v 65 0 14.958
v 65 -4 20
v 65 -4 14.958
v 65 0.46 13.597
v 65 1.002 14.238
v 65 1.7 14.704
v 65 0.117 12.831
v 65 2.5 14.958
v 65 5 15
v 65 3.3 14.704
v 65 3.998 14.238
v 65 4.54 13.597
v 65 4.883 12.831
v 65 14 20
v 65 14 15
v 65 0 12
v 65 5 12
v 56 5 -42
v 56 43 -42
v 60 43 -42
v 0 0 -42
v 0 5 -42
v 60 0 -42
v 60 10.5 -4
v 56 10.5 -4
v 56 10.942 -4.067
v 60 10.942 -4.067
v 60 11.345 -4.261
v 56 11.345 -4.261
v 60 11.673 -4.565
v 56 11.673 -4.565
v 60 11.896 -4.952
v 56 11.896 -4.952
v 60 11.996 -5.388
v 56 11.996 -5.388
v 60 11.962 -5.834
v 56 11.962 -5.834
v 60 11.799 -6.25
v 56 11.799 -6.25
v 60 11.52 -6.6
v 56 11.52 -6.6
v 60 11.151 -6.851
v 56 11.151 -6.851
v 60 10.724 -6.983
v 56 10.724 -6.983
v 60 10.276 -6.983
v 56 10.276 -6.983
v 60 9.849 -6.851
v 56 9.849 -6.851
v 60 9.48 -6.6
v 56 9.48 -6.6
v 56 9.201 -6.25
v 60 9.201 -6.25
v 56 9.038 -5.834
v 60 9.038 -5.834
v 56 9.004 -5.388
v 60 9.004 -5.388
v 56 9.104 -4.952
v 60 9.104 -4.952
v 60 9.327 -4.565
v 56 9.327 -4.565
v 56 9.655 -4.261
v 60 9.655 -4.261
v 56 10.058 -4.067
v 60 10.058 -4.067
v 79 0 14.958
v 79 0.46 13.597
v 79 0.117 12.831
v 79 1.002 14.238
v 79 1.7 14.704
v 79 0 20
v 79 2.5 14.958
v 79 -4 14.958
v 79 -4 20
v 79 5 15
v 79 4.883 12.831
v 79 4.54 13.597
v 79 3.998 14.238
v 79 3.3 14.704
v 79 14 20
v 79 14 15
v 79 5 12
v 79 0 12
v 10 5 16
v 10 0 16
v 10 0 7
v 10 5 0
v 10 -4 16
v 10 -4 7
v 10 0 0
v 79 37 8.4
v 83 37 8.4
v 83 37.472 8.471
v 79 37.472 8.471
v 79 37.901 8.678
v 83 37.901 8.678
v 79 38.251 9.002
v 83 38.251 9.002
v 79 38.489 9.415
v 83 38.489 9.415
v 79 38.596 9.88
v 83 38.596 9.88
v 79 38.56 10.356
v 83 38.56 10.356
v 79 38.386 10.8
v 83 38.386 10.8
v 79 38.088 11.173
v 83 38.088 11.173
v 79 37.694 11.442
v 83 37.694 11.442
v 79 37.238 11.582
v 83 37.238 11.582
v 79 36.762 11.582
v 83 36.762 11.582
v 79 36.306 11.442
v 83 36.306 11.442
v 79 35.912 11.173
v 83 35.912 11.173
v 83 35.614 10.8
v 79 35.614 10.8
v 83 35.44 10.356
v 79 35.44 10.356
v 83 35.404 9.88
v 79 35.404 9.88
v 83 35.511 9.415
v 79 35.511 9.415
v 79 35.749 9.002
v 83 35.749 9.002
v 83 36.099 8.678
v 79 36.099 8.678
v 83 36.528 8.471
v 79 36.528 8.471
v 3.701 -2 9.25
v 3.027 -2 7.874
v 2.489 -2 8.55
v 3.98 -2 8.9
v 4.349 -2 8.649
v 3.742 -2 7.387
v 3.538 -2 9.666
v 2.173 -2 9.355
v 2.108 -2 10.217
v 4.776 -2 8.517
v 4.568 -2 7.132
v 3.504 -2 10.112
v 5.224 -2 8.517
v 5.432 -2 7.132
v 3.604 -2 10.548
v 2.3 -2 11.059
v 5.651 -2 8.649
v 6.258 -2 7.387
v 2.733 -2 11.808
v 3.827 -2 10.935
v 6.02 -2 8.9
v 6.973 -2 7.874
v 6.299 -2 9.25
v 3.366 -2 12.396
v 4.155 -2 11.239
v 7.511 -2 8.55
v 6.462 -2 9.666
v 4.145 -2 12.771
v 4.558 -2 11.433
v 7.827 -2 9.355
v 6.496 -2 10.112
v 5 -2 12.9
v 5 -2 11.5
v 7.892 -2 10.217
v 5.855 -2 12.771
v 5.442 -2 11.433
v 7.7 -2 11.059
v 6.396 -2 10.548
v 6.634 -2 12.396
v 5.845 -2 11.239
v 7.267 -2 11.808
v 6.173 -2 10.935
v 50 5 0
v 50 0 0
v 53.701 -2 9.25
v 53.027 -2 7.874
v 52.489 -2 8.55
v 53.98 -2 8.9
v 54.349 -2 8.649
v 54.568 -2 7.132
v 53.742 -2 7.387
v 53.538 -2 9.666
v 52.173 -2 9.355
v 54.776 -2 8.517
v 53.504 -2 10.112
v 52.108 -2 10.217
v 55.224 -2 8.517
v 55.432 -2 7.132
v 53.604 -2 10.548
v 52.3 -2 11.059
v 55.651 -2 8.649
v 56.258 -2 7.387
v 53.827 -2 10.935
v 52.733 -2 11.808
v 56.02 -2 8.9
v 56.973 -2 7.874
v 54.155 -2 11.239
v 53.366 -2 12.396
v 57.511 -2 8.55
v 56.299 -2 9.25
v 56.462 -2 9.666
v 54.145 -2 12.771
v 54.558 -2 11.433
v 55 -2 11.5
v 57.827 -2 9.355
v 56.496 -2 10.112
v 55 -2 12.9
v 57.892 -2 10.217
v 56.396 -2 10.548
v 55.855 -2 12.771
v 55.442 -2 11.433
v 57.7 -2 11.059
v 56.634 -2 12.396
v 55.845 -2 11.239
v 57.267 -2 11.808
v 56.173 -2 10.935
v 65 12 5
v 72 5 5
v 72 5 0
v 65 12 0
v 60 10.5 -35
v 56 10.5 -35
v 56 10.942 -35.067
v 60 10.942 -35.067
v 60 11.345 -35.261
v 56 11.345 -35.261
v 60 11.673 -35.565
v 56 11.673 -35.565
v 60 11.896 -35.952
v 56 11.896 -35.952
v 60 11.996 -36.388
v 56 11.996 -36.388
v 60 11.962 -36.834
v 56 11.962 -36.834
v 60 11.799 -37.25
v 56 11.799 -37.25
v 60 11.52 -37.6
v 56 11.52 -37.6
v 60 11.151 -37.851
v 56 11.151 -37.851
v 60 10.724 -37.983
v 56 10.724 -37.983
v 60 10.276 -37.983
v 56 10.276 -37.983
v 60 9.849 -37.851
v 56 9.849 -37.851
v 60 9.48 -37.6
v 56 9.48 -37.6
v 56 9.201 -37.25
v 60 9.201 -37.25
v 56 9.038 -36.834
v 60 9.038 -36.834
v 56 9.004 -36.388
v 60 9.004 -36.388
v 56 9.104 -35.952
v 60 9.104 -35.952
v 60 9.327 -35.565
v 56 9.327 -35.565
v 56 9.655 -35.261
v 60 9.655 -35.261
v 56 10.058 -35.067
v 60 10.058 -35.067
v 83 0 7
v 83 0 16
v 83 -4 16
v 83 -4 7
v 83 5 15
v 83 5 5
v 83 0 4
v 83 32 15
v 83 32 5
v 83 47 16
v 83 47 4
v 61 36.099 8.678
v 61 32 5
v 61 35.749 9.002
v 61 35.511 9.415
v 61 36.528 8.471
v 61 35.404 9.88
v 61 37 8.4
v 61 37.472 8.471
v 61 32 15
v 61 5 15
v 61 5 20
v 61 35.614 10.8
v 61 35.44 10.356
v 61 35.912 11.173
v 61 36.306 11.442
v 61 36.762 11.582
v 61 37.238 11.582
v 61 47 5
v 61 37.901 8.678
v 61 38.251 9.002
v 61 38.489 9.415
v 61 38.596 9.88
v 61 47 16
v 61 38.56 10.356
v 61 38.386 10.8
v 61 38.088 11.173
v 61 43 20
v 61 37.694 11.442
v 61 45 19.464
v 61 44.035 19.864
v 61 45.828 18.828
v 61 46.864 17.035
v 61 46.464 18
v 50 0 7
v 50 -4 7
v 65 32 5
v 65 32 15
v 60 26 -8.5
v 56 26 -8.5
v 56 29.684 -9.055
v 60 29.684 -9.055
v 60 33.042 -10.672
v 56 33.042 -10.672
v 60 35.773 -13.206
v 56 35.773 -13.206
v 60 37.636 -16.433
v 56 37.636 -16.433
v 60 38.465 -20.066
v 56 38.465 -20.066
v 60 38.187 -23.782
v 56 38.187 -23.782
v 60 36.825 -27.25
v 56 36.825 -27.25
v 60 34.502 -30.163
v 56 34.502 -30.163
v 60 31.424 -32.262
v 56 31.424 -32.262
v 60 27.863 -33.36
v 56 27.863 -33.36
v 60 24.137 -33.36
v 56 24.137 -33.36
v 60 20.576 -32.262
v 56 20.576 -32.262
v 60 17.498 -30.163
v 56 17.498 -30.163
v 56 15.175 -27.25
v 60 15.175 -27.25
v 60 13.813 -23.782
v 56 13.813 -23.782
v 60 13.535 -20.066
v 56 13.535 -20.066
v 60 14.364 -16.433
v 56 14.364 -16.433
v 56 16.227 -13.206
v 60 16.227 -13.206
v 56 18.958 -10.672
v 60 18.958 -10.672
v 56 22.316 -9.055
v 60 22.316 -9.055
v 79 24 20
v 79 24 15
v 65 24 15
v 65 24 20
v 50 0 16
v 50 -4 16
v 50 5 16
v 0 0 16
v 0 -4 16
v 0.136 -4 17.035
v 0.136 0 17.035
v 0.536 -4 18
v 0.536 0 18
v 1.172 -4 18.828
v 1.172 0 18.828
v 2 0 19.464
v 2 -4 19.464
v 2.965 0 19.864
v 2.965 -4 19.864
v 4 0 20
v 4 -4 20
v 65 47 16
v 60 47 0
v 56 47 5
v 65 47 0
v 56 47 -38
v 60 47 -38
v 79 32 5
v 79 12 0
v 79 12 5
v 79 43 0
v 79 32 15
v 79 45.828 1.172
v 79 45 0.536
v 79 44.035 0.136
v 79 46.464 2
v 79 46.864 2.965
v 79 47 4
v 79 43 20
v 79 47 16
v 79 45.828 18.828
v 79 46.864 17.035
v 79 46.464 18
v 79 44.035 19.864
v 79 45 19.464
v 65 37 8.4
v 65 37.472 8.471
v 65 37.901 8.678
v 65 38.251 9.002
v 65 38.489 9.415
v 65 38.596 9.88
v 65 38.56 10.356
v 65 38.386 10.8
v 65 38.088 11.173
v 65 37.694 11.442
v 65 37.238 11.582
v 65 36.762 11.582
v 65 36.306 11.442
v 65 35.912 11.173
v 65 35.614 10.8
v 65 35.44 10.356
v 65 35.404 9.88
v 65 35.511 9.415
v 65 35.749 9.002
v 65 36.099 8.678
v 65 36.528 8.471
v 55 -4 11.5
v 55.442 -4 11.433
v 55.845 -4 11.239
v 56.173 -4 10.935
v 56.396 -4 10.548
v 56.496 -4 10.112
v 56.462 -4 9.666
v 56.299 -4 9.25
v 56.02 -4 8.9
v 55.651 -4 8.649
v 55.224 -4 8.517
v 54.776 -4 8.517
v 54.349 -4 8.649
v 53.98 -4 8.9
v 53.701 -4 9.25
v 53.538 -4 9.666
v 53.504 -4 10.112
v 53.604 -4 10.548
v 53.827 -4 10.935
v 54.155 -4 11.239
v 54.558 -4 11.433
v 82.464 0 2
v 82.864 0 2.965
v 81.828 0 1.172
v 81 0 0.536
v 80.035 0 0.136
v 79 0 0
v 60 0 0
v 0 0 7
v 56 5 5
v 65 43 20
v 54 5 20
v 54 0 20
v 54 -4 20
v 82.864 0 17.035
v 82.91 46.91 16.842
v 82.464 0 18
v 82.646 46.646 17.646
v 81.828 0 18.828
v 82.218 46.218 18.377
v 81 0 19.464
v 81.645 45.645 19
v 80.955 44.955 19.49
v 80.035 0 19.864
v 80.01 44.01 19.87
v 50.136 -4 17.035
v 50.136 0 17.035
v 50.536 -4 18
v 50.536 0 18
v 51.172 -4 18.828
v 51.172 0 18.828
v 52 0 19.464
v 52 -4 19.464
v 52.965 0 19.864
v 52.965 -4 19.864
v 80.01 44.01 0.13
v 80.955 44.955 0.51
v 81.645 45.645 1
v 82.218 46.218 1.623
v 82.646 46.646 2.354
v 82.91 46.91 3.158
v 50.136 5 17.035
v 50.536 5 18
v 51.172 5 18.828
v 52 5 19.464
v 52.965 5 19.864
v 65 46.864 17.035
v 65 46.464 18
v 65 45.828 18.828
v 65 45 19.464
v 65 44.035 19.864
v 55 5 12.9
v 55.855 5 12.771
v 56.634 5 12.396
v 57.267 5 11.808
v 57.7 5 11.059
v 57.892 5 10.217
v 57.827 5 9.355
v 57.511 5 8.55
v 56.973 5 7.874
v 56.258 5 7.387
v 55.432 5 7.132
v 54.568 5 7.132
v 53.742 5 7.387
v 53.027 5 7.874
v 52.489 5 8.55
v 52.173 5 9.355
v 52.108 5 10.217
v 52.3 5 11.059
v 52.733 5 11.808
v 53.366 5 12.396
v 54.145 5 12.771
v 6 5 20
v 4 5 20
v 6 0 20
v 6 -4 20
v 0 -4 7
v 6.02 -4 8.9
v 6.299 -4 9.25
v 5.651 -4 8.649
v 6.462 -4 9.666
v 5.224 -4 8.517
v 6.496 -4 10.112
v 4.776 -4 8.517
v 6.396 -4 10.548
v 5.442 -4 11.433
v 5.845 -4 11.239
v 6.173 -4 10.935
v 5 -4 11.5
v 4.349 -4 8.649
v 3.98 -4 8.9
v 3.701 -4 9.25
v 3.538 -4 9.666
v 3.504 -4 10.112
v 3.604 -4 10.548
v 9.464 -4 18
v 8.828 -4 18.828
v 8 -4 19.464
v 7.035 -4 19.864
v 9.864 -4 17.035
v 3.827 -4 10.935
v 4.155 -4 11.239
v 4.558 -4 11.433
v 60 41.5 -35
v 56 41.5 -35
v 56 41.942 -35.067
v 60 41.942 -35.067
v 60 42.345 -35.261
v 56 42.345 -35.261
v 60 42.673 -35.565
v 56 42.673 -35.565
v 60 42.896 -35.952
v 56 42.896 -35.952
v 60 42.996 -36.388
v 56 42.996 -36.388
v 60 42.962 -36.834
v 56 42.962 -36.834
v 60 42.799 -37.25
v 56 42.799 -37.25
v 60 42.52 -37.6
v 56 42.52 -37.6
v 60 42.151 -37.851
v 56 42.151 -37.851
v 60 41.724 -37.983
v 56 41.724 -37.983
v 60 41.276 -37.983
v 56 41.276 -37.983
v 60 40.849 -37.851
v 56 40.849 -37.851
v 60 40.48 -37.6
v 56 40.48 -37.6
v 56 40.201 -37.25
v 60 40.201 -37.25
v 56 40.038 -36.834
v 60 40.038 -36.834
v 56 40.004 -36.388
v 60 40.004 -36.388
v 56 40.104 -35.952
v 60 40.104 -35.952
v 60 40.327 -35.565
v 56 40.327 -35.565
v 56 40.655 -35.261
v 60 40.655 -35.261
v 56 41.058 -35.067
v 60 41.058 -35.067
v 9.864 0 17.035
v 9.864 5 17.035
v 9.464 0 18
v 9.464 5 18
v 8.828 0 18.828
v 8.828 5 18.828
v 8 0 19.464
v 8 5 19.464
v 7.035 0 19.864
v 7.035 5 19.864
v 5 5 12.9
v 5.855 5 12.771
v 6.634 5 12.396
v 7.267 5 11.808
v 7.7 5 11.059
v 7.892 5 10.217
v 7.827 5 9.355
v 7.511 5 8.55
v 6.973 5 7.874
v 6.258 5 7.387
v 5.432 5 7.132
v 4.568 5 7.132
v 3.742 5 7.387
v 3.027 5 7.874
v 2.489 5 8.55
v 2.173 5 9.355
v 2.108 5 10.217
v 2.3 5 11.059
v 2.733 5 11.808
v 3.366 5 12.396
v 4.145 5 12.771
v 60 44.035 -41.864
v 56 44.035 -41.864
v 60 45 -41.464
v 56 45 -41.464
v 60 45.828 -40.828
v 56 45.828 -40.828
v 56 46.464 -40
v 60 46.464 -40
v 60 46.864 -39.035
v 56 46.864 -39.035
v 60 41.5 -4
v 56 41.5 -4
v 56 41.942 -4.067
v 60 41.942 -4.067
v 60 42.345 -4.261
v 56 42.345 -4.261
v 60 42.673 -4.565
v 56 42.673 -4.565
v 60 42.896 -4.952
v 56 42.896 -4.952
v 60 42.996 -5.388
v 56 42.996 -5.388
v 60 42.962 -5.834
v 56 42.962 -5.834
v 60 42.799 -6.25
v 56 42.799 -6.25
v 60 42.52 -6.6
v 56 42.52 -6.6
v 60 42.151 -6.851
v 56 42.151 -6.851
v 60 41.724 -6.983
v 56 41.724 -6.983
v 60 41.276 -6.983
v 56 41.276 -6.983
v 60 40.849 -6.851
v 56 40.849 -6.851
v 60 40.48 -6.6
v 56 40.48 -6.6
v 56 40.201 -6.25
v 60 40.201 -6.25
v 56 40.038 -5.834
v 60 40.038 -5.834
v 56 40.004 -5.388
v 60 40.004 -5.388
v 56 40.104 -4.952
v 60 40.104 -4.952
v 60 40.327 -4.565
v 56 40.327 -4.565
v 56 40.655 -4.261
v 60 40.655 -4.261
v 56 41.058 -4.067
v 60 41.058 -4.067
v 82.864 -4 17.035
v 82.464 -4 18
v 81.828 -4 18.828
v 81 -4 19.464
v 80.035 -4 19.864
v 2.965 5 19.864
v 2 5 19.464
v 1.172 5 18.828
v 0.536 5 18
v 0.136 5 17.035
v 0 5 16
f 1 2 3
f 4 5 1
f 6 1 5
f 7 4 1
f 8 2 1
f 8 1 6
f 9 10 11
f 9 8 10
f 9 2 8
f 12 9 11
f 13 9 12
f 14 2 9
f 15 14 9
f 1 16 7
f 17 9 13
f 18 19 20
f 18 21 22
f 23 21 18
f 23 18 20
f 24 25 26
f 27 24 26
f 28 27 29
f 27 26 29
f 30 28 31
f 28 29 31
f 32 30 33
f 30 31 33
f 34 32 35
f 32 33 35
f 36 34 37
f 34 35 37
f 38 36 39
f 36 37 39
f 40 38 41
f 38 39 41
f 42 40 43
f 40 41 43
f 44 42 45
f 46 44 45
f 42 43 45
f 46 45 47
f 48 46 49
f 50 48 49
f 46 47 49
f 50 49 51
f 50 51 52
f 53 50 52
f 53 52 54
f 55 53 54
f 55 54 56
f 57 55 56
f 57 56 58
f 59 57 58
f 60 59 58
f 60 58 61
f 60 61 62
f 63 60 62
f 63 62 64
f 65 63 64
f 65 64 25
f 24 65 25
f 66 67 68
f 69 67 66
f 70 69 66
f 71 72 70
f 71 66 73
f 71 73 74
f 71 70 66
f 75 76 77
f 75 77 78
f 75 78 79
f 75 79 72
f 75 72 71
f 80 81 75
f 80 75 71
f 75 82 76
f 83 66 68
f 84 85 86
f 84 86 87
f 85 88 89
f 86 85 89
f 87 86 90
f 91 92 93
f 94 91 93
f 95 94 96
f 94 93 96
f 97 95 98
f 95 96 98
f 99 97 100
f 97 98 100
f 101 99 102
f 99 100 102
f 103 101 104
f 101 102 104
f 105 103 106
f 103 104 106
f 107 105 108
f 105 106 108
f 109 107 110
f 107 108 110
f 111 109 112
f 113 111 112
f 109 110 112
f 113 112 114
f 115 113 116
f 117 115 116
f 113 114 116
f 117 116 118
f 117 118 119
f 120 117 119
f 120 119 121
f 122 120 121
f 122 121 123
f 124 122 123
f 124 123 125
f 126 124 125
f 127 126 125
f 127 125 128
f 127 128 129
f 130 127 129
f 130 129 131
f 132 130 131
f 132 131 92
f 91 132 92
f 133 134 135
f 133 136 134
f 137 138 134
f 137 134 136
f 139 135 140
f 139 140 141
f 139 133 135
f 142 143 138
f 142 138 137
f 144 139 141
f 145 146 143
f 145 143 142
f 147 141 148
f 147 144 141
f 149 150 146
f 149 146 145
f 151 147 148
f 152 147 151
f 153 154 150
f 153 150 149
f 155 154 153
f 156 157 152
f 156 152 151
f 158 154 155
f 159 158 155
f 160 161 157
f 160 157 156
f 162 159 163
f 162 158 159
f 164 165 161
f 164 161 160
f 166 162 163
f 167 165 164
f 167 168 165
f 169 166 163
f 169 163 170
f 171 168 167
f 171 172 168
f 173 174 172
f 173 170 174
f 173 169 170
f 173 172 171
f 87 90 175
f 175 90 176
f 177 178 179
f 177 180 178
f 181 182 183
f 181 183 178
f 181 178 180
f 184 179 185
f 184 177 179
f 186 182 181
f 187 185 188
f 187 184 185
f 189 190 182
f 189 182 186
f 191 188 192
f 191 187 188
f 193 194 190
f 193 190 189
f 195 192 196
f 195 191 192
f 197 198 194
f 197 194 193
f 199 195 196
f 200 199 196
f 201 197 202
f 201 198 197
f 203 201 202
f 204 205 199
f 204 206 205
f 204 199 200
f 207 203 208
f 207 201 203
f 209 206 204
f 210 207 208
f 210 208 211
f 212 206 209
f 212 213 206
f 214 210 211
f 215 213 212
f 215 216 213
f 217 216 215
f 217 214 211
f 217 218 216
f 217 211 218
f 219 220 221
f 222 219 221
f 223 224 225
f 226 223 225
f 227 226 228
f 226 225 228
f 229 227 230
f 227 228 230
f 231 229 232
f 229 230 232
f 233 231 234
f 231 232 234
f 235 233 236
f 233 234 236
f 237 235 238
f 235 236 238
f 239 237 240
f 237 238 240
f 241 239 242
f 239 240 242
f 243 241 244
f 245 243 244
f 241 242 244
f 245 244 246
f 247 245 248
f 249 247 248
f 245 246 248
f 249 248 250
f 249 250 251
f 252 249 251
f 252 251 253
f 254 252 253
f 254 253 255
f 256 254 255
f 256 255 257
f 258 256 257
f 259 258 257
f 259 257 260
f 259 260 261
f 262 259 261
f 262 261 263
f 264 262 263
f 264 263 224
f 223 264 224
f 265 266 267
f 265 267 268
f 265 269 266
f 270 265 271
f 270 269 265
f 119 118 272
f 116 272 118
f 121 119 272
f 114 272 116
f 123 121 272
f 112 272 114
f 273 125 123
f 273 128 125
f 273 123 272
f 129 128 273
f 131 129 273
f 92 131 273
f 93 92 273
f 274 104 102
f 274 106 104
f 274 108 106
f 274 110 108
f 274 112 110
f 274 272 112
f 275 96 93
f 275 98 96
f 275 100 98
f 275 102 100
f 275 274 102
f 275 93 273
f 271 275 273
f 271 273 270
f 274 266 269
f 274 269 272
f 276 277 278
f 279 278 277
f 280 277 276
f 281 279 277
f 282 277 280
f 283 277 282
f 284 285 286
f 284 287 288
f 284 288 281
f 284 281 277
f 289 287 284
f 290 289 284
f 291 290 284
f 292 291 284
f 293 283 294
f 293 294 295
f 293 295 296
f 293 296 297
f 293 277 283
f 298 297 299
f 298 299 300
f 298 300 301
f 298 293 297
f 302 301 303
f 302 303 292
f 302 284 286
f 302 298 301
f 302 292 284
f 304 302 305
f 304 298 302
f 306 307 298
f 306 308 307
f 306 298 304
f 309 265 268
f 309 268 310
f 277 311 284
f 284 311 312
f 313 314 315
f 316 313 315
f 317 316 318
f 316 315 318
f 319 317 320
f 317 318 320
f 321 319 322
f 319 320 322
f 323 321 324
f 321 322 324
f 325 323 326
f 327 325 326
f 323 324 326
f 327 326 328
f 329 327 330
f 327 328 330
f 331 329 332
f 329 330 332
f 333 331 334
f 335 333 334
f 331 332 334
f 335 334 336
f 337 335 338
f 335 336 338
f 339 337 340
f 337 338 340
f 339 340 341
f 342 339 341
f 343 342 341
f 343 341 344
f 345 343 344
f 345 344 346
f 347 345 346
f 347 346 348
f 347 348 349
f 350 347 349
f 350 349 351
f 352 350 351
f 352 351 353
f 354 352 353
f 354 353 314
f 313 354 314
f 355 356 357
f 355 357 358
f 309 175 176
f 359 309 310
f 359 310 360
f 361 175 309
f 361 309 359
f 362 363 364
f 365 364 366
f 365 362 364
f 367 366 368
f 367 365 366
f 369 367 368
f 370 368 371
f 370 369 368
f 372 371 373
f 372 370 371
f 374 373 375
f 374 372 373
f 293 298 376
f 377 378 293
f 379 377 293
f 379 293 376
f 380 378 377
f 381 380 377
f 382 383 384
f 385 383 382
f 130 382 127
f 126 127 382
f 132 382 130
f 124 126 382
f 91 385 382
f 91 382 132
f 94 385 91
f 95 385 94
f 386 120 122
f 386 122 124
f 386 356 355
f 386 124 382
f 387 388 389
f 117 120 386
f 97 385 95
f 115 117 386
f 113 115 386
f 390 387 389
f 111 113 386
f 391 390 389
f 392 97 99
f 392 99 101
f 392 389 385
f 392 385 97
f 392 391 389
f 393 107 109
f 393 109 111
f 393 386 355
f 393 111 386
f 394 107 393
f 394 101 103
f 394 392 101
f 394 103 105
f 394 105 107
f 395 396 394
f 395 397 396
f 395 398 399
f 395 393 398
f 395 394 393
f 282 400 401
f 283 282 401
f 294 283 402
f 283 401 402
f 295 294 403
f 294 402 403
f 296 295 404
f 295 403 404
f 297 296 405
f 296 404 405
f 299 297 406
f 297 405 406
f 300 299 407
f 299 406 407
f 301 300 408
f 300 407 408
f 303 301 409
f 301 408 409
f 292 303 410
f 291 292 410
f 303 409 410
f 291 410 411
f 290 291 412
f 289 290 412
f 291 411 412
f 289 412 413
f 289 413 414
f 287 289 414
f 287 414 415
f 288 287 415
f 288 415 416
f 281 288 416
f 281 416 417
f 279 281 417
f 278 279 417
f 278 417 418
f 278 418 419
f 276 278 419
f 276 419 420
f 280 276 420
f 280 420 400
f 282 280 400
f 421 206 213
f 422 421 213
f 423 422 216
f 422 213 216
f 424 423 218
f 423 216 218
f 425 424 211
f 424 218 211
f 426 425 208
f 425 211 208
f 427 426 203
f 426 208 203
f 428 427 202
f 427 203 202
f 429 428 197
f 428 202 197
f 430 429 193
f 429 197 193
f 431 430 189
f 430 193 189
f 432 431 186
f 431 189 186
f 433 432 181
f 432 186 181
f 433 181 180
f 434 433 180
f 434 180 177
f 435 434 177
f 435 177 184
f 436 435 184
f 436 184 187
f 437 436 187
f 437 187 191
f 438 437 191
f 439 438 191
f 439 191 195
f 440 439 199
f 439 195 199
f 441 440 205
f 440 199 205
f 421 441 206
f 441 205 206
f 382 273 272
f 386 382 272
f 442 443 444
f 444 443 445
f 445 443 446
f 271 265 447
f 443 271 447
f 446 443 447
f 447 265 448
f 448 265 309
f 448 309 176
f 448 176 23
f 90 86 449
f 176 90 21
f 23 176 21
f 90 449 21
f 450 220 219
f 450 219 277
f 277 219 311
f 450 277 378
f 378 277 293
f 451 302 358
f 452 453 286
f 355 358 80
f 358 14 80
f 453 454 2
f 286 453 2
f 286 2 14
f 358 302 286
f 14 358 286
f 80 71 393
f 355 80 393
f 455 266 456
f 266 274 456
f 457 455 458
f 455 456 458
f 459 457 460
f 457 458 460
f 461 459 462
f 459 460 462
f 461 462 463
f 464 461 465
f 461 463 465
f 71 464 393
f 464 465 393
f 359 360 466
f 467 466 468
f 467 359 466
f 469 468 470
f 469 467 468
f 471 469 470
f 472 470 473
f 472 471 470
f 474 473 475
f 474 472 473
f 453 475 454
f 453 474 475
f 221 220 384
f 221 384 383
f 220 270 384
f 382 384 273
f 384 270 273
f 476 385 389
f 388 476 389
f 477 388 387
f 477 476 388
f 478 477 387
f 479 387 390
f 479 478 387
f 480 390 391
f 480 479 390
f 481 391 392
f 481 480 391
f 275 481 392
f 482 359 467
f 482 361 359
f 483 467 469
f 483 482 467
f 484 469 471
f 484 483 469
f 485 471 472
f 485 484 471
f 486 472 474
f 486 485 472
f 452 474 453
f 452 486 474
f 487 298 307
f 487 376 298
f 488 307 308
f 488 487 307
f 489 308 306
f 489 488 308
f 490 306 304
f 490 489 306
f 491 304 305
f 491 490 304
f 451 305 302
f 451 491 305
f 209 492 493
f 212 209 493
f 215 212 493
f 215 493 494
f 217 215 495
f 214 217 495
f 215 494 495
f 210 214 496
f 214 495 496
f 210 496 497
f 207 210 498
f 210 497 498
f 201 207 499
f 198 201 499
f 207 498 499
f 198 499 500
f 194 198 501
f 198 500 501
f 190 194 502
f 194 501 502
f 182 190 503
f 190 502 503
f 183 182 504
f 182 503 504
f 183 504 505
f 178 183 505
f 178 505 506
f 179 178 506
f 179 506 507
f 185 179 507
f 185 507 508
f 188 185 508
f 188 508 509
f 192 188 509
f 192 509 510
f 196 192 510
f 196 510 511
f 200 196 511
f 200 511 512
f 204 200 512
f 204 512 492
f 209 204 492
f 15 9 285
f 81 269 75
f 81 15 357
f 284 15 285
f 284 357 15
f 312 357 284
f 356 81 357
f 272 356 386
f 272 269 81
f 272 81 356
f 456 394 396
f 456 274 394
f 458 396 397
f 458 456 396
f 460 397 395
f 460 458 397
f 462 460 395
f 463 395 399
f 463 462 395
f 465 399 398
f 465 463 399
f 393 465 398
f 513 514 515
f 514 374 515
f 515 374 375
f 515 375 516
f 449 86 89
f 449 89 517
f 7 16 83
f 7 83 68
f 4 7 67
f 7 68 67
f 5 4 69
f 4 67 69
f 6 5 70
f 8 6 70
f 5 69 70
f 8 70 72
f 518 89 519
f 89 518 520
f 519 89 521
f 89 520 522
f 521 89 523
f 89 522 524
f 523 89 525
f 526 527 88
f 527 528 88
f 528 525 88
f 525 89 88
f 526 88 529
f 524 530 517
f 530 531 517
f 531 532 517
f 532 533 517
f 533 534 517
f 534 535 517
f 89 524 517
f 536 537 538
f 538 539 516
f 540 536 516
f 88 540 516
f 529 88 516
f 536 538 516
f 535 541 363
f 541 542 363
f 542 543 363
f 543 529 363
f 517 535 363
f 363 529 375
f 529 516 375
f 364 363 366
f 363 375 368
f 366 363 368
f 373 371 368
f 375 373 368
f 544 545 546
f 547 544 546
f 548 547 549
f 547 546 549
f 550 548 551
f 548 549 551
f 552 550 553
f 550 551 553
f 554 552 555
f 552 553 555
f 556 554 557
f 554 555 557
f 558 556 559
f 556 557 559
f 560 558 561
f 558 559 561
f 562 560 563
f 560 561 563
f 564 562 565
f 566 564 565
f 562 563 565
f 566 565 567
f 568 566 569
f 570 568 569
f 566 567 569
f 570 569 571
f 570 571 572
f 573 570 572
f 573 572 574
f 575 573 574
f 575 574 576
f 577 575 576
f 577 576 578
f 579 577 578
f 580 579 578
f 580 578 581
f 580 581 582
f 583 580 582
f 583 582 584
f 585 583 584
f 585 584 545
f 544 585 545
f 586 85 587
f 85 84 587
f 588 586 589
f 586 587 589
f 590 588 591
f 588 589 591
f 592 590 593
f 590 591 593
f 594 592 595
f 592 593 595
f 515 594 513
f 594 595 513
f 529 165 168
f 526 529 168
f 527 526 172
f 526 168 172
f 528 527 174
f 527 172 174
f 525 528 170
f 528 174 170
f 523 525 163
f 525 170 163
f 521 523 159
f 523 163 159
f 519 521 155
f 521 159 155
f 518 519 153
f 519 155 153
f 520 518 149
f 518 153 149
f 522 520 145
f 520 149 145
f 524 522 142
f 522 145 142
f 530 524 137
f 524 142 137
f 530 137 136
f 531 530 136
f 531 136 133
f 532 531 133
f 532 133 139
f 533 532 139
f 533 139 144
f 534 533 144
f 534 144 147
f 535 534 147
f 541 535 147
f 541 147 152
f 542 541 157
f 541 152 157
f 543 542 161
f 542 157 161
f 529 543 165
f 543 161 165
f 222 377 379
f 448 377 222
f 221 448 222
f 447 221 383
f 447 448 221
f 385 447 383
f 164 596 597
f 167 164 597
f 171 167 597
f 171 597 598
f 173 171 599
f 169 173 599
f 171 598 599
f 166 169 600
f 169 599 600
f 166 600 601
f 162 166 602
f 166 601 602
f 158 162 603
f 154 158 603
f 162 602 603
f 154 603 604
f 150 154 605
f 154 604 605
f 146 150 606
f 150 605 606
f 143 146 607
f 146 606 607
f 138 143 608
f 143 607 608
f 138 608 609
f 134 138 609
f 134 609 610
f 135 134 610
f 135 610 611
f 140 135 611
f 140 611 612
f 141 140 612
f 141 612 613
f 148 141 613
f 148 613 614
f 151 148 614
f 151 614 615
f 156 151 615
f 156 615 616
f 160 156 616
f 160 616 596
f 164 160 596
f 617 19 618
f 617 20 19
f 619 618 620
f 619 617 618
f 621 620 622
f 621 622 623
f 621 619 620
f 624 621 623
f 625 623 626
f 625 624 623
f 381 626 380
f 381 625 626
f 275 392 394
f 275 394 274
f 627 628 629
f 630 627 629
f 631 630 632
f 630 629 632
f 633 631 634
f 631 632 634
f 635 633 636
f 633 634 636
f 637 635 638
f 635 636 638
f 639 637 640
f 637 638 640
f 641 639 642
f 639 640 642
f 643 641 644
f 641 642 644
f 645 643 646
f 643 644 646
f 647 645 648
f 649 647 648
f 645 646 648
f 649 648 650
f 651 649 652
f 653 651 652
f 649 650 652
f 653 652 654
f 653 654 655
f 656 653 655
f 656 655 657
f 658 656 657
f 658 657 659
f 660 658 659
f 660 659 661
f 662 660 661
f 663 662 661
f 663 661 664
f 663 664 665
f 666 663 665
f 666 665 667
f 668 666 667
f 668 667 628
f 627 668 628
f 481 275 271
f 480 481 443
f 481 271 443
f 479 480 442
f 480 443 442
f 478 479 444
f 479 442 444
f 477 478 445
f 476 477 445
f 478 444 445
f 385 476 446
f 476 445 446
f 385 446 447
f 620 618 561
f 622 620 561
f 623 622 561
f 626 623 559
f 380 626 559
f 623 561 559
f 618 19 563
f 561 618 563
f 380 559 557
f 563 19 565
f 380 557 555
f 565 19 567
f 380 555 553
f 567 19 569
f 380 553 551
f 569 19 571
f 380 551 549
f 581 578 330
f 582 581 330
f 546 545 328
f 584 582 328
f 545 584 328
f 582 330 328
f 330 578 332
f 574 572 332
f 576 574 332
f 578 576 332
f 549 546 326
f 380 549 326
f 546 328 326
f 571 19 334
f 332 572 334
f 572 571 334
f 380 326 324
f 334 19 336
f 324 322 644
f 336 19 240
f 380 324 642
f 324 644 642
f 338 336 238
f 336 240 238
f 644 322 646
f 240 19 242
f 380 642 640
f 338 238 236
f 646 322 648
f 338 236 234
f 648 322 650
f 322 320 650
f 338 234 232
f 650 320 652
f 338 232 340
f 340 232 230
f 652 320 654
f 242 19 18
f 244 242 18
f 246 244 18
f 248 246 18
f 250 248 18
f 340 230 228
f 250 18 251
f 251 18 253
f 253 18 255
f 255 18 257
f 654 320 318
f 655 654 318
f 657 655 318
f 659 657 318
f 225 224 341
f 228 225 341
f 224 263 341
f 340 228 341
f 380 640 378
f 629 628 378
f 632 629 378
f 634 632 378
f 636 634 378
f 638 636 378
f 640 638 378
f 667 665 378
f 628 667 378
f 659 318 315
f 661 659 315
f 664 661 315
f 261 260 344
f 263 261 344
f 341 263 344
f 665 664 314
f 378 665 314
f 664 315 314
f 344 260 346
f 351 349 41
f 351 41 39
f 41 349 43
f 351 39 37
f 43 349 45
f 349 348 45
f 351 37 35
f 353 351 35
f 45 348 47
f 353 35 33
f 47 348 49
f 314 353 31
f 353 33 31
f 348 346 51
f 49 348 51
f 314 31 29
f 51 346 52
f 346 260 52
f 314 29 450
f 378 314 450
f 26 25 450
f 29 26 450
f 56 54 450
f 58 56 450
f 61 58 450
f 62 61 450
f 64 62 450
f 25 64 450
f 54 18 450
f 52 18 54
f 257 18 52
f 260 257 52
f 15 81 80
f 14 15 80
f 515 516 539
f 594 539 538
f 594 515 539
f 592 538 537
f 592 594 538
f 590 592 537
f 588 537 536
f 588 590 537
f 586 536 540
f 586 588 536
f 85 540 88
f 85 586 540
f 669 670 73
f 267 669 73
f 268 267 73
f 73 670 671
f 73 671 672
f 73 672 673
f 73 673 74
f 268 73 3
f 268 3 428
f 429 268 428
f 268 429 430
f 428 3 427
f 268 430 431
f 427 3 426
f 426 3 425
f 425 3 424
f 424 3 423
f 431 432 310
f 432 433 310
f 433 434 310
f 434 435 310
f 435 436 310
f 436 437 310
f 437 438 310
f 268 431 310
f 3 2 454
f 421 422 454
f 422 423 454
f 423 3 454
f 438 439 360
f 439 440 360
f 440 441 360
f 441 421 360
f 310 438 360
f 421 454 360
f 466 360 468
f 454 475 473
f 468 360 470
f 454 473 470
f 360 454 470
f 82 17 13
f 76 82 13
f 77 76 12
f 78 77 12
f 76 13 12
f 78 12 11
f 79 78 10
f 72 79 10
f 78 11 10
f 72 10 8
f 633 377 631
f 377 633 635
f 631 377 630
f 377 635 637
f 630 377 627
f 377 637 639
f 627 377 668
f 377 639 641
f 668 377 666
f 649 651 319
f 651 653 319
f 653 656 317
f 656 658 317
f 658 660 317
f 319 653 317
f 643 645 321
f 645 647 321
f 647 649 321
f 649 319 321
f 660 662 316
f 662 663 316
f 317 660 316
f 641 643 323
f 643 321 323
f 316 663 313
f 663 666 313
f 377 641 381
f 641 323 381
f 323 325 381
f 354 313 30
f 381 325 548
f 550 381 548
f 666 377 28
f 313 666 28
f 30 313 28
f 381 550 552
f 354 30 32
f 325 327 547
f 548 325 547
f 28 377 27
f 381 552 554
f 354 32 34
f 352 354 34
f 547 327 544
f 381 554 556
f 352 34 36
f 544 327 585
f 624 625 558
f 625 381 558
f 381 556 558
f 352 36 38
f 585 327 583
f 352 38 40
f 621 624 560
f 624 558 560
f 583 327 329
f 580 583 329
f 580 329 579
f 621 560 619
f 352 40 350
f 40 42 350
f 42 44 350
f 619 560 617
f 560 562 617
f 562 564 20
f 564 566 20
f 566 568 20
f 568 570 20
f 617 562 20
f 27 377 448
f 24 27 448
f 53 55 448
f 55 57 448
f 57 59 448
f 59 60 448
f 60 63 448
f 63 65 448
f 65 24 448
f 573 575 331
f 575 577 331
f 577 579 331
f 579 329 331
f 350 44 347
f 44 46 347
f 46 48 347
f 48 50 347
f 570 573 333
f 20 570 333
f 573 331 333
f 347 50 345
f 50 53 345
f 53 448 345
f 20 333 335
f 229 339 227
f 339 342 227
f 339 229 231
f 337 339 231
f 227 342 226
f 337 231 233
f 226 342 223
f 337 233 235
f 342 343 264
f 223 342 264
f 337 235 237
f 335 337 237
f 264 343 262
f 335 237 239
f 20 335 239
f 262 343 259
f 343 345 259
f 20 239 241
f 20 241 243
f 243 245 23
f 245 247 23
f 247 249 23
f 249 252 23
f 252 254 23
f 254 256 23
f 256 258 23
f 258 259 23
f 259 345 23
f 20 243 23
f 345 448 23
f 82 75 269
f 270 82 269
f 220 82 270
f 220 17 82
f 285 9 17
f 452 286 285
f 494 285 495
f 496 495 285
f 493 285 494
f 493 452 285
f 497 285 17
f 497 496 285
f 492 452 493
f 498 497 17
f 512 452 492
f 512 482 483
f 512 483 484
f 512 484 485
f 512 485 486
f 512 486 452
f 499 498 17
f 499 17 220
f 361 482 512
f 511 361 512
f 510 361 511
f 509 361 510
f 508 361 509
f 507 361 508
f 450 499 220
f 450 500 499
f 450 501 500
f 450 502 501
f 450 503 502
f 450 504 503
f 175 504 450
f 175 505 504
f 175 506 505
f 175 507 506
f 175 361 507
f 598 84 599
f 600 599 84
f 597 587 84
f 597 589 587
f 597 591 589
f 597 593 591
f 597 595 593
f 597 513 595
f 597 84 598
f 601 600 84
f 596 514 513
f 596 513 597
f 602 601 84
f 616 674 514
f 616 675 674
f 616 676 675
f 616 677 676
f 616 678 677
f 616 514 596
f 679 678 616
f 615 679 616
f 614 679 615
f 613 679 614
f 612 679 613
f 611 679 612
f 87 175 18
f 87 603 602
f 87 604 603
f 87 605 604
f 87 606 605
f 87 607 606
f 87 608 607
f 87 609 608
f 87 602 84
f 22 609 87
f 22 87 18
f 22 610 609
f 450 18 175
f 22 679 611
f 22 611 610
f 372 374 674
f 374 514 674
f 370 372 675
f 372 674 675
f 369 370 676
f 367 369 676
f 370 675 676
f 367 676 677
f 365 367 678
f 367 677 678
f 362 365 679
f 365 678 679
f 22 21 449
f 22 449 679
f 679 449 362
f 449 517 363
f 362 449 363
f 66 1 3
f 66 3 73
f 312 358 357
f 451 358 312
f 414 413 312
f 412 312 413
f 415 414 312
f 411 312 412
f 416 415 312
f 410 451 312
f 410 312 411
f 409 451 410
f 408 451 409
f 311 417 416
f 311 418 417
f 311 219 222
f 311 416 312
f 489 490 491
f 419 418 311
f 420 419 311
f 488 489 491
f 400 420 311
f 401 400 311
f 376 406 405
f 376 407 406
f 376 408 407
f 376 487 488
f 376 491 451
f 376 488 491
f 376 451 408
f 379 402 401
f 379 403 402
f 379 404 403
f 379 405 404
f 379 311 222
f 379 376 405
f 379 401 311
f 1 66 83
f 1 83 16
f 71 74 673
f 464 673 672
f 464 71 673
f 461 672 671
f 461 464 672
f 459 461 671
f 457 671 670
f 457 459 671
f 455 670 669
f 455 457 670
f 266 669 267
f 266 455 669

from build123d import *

# Parameters (mm, degrees)
EXTRUDE_1_DEPTH      = 5
SKETCH_3_W           = 4
SKETCH_3_H           = 42
EXTRUDE_2_DEPTH      = 42
SKETCH_4_R           = 1.5
CUT_EXTRUDE_1_DEPTH  = 42.5
SKETCH_5_R           = 12.5
CUT_EXTRUDE_2_DEPTH  = 42.5
SKETCH_6_R           = 1.5
CUT_EXTRUDE_3_DEPTH  = 42.5
SKETCH_7_W           = 20
SKETCH_7_H           = 5
EXTRUDE_3_DEPTH      = 5
EXTRUDE_5_DEPTH      = 42
SKETCH_11_W          = 20
SKETCH_11_H          = 5
EXTRUDE_6_DEPTH      = 18
SKETCH_12_W          = 4
SKETCH_12_H          = 20
EXTRUDE_7_DEPTH      = 42
CUT_EXTRUDE_4_REACH  = 106.221
SKETCH_13_R          = 1.6
CUT_EXTRUDE_START    = -22
SKETCH_15_W          = 10
SKETCH_15_H          = 27
CUT_EXTRUDE_5_DEPTH  = 22
SKETCH_16_W          = 5
SKETCH_16_H          = 5
CUT_EXTRUDE_6_DEPTH  = 42
EXTRUDE_START        = -22
SKETCH_17_W          = 10
SKETCH_17_H          = 5
EXTRUDE_8_DEPTH      = 22
CUT_EXTRUDE_7_DEPTH  = 5
FILLET_1_R           = 4
SKETCH_20_W          = 14
SKETCH_20_H          = 5
CUT_EXTRUDE_8_DEPTH  = 5
FILLET_3_R           = 3
SKETCH_21_R          = 2.9
CUT_EXTRUDE_9_DEPTH  = 3
EXTRUDE_9_DEPTH      = 4
SKETCH_24_R          = 1.5
CUT_EXTRUDE_10_DEPTH = 4
SKETCH_26_R          = 2.9
CUT_EXTRUDE_15_DEPTH = 4
CHAMFER_1_SIZE       = 7
EXTRUDE_10_REACH     = 103.064
SKETCH_28_W          = 5
SKETCH_28_H          = 10


# Some blends are built 0.0001 mm under size
with BuildPart() as part:
    # 草图1 → 凸台-拉伸1 (new body)
    with BuildSketch(Plane(origin=(0, 0, 0), x_dir=(1, 0, 0), z_dir=(0, 1, 0))):
        Polygon((10, 0), (50, 0), (50, -20), (60, -20), (60, 0), (60, 42), (0, 42), (0, 0), (0, -20), (10, -20), align=None)
    extrude(amount=EXTRUDE_1_DEPTH)

    # 草图3 → 凸台-拉伸2 (add)
    with BuildSketch(Plane(origin=(0, 5, 0), x_dir=(1, 0, 0), z_dir=(0, 1, 0))):
        with Locations((58, 21)):
            Rectangle(SKETCH_3_W, SKETCH_3_H)
    extrude(amount=EXTRUDE_2_DEPTH)

    # 草图4 → 切除-拉伸1 (cut)
    with BuildSketch(Plane.ZY.offset(-56)):
        with Locations((-36.5, 41.5)):
            Circle(SKETCH_4_R)
        with Locations((-5.5, 41.5)):
            Circle(SKETCH_4_R)
        with Locations((-5.5, 10.5)):
            Circle(SKETCH_4_R)
        with Locations((-36.5, 10.5)):
            Circle(SKETCH_4_R)
    extrude(amount=-CUT_EXTRUDE_1_DEPTH, mode=Mode.SUBTRACT)

    # 草图5 → 切除-拉伸2 (cut)
    with BuildSketch(Plane.ZY.offset(-56)):
        with Locations((-21, 26)):
            Circle(SKETCH_5_R)
    extrude(amount=-CUT_EXTRUDE_2_DEPTH, mode=Mode.SUBTRACT)

    # 草图6 → 切除-拉伸3 (cut)
    with BuildSketch(Plane(origin=(0, 5, 0), x_dir=(1, 0, 0), z_dir=(0, 1, 0))):
        with Locations(Location((55, -10, 0), (0, 0, 270))):
            Circle(SKETCH_6_R)
        with Locations(Location((5, -10, 0), (0, 0, 270))):
            Circle(SKETCH_6_R)
    extrude(amount=-CUT_EXTRUDE_3_DEPTH, mode=Mode.SUBTRACT)

    # 草图7 → 凸台-拉伸3 (add)
    with BuildSketch(Plane(origin=(60, 0, 0), x_dir=(0, 0, -1), z_dir=(1, 0, 0))):
        with Locations((-10, 2.5)):
            Rectangle(SKETCH_7_W, SKETCH_7_H)
    extrude(amount=EXTRUDE_3_DEPTH)

    # 草图8 → 凸台-拉伸5 (add)
    with BuildSketch(Plane(origin=(0, 5, 0), x_dir=(1, 0, 0), z_dir=(0, 1, 0))):
        Polygon((65, 0), (56, 0), (56, -5), (61, -5), (61, -15), (56, -15), (56, -20), (65, -20), align=None)
    extrude(amount=EXTRUDE_5_DEPTH)

    # 草图11 → 凸台-拉伸6 (add)
    with BuildSketch(Plane(origin=(65, 0, 0), x_dir=(0, 0, -1), z_dir=(1, 0, 0))):
        with Locations((-10, 2.5)):
            Rectangle(SKETCH_11_W, SKETCH_11_H)
    extrude(amount=EXTRUDE_6_DEPTH)

    # 草图12 → 凸台-拉伸7 (add)
    with BuildSketch(Plane(origin=(0, 5, 0), x_dir=(1, 0, 0), z_dir=(0, 1, 0))):
        with Locations((81, -10)):
            Rectangle(SKETCH_12_W, SKETCH_12_H)
    extrude(amount=EXTRUDE_7_DEPTH)

    # 切除-拉伸4: up to this face of the body (flat: up to its plane)
    cut_extrude_4_end = Plane(part.part.faces().sort_by_distance((61, 26, 10))[0])
    # 草图13 → 切除-拉伸4 (cut, up to the picked face)
    with BuildSketch(Plane(origin=(83, 0, 0), x_dir=(0, 0, -1), z_dir=(1, 0, 0)), mode=Mode.PRIVATE) as cut_extrude_4_sk1:
        with Locations((-10, 37)):
            Circle(SKETCH_13_R)
    cut_extrude_4_tool1 = split(extrude(cut_extrude_4_sk1.sketch, amount=-CUT_EXTRUDE_4_REACH, mode=Mode.PRIVATE), bisect_by=cut_extrude_4_end, keep=Keep.BOTH, mode=Mode.PRIVATE)
    add(cut_extrude_4_tool1.solids().sort_by(Axis((83, 37, 10), (-1, 0, 0)))[0], mode=Mode.SUBTRACT)

    # 草图15 → 切除-拉伸5 (cut)
    with BuildSketch(Plane.ZY.offset(-61).offset(CUT_EXTRUDE_START)):
        with Locations((10, 18.5)):
            Rectangle(SKETCH_15_W, SKETCH_15_H)
    extrude(amount=CUT_EXTRUDE_5_DEPTH, mode=Mode.SUBTRACT)

    # 草图16 → 切除-拉伸6 (cut)
    with BuildSketch(Plane(origin=(0, 47, 0), x_dir=(1, 0, 0), z_dir=(0, 1, 0))):
        with Locations((58.5, -17.5)):
            Rectangle(SKETCH_16_W, SKETCH_16_H)
    extrude(amount=-CUT_EXTRUDE_6_DEPTH, mode=Mode.SUBTRACT)

    # 草图17 → 凸台-拉伸8 (add)
    with BuildSketch(Plane.ZY.offset(-61).offset(EXTRUDE_START)):
        with Locations((10, 7.5)):
            Rectangle(SKETCH_17_W, SKETCH_17_H)
    extrude(amount=EXTRUDE_8_DEPTH)

    # 草图19 → 切除-拉伸7 (cut)
    with BuildSketch(Plane(origin=(0, 10, 0), x_dir=(1, 0, 0), z_dir=(0, 1, 0))):
        Polygon((79, -15), (83, -15), (83, -5), (79, -5), (65, -5), (61, -5), (61, -15), (65, -15), align=None)
    extrude(amount=-CUT_EXTRUDE_7_DEPTH, mode=Mode.SUBTRACT)

    # 圆角1
    fillet_1_edges = [part.edges().sort_by_distance(p)[0] for p in [
        (83, 23.5, 0),
        (83, 23.5, 20),
        (81, 47, 20),
        (81, 47, 0),
        (50, 2.5, 20),
        (10, 2.5, 20),
        (0, 2.5, 20),
        (58, 47, -42),
        (63, 47, 20),
    ]]
    fillet(fillet_1_edges, radius=FILLET_1_R - 0.0001)  # a hair under: the kernel refuses the full size

    # 草图20 → 切除-拉伸8 (cut)
    with BuildSketch(Plane.XY.offset(20)):
        with Locations((72, 2.5)):
            Rectangle(SKETCH_20_W, SKETCH_20_H)
    extrude(amount=-CUT_EXTRUDE_8_DEPTH, mode=Mode.SUBTRACT)

    # 圆角3
    # the kernel refuses this fillet: 3 mm, written as the material it takes off along each edge
    with BuildSketch(Plane(origin=(79, 0, 15), x_dir=(0, 0, -1), z_dir=(-1, 0, 0)), Plane(origin=(65, 5, 15), x_dir=(0, 0, -1), z_dir=(1, 0, 0))) as fillet_3_piece_1:
        with BuildLine():
            CenterArc((FILLET_3_R, -FILLET_3_R), FILLET_3_R, 90, 90)
            Line((0, -FILLET_3_R), (0, 0))
            Line((0, 0), (FILLET_3_R, 0))
        make_face()
    extrude(amount=14, mode=Mode.SUBTRACT)

    # 草图21 → 切除-拉伸9 (cut)
    with BuildSketch(Plane(origin=(0, 5, 0), x_dir=(1, 0, 0), z_dir=(0, 1, 0))):
        with Locations(Location((5, -10, 0), (0, 0, 270))):
            Circle(SKETCH_21_R)
        with Locations(Location((55, -10, 0), (0, 0, 270))):
            Circle(SKETCH_21_R)
    extrude(amount=-CUT_EXTRUDE_9_DEPTH, mode=Mode.SUBTRACT)

    # 草图23 → 凸台-拉伸9 (add)
    with BuildSketch(Plane.XZ):
        with BuildLine():
            Line((54, 20), (65, 20))
            Line((65, 20), (65, 14.958039892))
            Line((65, 14.958039892), (79, 14.958039892))
            Line((79, 14.958039892), (79, 20))
            ThreePointArc((79, 20), (81.828427125, 18.828427125), (83, 16))
            Line((83, 16), (83, 7))
            Line((83, 7), (50, 7))
            Line((50, 7), (50, 16))
            ThreePointArc((50, 16), (51.171572875, 18.828427125), (54, 20))
        make_face()
        with BuildLine():
            Line((4, 20), (6, 20))
            ThreePointArc((6, 20), (8.828427125, 18.828427125), (10, 16))
            Line((10, 16), (10, 7))
            Line((10, 7), (0, 7))
            Line((0, 7), (0, 16))
            ThreePointArc((0, 16), (1.171572875, 18.828427125), (4, 20))
        make_face()
    extrude(amount=EXTRUDE_9_DEPTH)

    # 草图24 → 切除-拉伸10 (cut)
    with BuildSketch(Plane(origin=(0, 0, 0), x_dir=(1, 0, 0), z_dir=(0, 1, 0))):
        with Locations(Location((55, -10, 0), (0, 0, 270))):
            Circle(SKETCH_24_R)
        with Locations(Location((5, -10, 0), (0, 0, 270))):
            Circle(SKETCH_24_R)
    extrude(amount=-CUT_EXTRUDE_10_DEPTH, mode=Mode.SUBTRACT)

    # 草图26 → 切除-拉伸15 (cut)
    with BuildSketch(Plane(origin=(0, 2, 0), x_dir=(1, 0, 0), z_dir=(0, 1, 0))):
        with Locations(Location((55, -10, 0), (0, 0, 270))):
            Circle(SKETCH_26_R)
        with Locations(Location((5, -10, 0), (0, 0, 270))):
            Circle(SKETCH_26_R)
    extrude(amount=-CUT_EXTRUDE_15_DEPTH, mode=Mode.SUBTRACT)

    # 倒角1
    chamfer_1_edges = [part.edges().sort_by_distance(p)[0] for p in [
        (79, 5, 2.5),
        (65, 5, 2.5),
    ]]
    chamfer(chamfer_1_edges, length=CHAMFER_1_SIZE - 0.0001)  # a hair under: the kernel refuses the full size

    # 草图28 → 凸台-拉伸10 (add, up to next)
    with BuildSketch(Plane.ZY.offset(-79), mode=Mode.PRIVATE) as extrude_10_sk1:
        with Locations((17.5, 19)):
            Rectangle(SKETCH_28_W, SKETCH_28_H)
    extrude_10_tool1 = extrude(extrude_10_sk1.sketch, amount=EXTRUDE_10_REACH, mode=Mode.PRIVATE) - part.part
    add(extrude_10_tool1.solids().sort_by_distance((79, 19, 17.5))[0])


solid = part.part
